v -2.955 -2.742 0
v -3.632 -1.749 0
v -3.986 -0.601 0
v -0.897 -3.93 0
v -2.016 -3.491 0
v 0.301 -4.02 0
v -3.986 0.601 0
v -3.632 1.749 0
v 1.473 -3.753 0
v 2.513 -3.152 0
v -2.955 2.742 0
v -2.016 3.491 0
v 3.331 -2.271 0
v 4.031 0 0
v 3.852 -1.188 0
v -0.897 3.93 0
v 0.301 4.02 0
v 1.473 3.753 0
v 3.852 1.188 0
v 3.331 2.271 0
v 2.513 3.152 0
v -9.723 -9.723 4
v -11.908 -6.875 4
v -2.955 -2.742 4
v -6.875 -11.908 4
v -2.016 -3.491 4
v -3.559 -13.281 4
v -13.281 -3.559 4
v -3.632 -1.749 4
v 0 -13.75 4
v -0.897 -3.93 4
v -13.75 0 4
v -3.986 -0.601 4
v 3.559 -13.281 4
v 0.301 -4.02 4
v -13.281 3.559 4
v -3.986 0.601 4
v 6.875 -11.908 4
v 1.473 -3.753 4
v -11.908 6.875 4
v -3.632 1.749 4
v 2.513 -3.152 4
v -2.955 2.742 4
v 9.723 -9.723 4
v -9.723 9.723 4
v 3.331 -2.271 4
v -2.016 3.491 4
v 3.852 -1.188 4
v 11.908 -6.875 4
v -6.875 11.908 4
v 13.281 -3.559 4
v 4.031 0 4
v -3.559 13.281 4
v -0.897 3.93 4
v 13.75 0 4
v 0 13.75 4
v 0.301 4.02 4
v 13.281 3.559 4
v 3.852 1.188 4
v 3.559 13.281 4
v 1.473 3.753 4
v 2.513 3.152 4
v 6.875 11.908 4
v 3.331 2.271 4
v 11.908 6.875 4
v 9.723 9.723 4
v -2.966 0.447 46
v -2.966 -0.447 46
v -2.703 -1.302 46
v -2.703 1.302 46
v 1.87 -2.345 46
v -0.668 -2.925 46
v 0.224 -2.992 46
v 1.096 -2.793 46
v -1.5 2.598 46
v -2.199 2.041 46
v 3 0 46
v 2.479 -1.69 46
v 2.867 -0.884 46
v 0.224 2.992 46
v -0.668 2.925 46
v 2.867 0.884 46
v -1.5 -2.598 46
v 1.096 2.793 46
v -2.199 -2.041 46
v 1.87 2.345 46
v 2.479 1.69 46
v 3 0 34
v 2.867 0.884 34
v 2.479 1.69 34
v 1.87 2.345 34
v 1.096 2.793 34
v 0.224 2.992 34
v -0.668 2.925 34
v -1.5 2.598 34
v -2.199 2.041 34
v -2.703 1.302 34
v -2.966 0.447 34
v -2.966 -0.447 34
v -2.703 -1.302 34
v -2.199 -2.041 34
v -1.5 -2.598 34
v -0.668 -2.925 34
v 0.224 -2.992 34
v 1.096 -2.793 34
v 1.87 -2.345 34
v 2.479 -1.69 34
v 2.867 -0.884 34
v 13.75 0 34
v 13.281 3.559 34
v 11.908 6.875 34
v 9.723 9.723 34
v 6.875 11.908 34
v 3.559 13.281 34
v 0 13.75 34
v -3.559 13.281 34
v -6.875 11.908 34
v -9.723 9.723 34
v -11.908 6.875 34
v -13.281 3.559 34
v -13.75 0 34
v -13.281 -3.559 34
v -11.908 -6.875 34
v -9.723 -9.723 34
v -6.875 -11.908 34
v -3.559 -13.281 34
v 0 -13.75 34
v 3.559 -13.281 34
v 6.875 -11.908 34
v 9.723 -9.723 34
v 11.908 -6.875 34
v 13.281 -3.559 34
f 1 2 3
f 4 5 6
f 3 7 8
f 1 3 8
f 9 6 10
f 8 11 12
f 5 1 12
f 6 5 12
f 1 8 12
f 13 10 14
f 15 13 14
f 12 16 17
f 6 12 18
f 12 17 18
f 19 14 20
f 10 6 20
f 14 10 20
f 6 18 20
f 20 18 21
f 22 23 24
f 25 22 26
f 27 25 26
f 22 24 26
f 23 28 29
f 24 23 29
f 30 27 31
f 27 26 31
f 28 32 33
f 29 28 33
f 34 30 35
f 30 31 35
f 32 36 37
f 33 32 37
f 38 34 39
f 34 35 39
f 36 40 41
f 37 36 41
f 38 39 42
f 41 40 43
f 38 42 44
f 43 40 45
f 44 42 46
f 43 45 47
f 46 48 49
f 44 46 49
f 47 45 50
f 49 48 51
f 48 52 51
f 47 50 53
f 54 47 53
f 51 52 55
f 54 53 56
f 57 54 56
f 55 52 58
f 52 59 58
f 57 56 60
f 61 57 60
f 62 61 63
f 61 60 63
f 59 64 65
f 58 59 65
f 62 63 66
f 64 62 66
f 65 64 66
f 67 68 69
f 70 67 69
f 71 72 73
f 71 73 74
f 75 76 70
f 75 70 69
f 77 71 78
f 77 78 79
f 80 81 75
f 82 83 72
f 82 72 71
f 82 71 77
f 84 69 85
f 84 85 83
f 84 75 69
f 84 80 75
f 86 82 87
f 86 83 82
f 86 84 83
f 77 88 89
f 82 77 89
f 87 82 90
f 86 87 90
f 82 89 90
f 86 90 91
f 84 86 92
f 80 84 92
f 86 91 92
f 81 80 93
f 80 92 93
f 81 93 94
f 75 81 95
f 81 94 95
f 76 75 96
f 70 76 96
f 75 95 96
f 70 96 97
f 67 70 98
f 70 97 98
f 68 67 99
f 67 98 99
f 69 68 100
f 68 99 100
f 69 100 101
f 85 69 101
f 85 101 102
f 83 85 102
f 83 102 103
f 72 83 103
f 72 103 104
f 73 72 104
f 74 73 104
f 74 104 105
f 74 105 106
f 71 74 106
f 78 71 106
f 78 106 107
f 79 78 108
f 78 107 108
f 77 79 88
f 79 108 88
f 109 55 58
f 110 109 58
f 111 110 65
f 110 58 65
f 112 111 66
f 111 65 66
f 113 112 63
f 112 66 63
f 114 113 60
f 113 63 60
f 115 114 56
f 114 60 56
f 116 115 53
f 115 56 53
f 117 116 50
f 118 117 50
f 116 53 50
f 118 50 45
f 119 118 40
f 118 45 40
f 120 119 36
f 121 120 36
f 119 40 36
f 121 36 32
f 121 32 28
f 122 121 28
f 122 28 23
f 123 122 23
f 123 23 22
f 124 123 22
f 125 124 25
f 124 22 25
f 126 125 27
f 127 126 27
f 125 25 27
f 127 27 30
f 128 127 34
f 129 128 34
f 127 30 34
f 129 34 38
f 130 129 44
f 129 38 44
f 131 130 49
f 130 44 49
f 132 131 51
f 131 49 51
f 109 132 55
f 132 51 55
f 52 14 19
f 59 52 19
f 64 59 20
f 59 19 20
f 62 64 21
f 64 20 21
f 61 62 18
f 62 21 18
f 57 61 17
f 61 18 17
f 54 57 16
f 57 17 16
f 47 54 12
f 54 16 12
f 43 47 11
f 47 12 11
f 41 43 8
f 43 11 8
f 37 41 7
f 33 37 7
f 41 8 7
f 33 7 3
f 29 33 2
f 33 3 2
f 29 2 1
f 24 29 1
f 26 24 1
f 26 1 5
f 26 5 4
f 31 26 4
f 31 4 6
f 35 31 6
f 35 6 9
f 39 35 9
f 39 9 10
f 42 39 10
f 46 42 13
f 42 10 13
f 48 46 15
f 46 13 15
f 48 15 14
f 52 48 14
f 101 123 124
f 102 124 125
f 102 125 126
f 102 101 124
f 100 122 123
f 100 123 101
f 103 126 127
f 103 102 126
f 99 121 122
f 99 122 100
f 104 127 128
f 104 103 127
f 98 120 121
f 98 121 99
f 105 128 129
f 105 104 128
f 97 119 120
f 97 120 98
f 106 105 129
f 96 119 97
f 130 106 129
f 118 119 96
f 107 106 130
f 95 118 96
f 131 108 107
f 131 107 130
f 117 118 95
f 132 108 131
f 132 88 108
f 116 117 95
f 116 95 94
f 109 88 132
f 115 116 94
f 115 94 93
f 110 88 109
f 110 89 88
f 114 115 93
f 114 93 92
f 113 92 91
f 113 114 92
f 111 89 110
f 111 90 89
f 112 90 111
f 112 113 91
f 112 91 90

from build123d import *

# Parameters (mm, degrees)
F0_R     = 4.03124
F1_DEPTH = 4
F2_R     = 13.75
F3_DEPTH = 30
F4_R     = 3
F5_DEPTH = 12


# Not quite as in the source:
# - a feature names something its author has since deleted; it is built from what else it names


with BuildPart() as f1:
    # F0 (on Top) → F1 (new body)
    with BuildSketch(Plane.XY):
        Circle(F0_R)
    extrude(amount=F1_DEPTH)

    # F2 (on face) → F3 (join)
    with BuildSketch(Plane.XY.offset(4)):
        Circle(F2_R)
    extrude(amount=F3_DEPTH)

    # F4 (on face) → F5 (join)
    with BuildSketch(Plane.XY.offset(34)):
        Circle(F4_R)
    extrude(amount=F5_DEPTH)


solid = f1.part
